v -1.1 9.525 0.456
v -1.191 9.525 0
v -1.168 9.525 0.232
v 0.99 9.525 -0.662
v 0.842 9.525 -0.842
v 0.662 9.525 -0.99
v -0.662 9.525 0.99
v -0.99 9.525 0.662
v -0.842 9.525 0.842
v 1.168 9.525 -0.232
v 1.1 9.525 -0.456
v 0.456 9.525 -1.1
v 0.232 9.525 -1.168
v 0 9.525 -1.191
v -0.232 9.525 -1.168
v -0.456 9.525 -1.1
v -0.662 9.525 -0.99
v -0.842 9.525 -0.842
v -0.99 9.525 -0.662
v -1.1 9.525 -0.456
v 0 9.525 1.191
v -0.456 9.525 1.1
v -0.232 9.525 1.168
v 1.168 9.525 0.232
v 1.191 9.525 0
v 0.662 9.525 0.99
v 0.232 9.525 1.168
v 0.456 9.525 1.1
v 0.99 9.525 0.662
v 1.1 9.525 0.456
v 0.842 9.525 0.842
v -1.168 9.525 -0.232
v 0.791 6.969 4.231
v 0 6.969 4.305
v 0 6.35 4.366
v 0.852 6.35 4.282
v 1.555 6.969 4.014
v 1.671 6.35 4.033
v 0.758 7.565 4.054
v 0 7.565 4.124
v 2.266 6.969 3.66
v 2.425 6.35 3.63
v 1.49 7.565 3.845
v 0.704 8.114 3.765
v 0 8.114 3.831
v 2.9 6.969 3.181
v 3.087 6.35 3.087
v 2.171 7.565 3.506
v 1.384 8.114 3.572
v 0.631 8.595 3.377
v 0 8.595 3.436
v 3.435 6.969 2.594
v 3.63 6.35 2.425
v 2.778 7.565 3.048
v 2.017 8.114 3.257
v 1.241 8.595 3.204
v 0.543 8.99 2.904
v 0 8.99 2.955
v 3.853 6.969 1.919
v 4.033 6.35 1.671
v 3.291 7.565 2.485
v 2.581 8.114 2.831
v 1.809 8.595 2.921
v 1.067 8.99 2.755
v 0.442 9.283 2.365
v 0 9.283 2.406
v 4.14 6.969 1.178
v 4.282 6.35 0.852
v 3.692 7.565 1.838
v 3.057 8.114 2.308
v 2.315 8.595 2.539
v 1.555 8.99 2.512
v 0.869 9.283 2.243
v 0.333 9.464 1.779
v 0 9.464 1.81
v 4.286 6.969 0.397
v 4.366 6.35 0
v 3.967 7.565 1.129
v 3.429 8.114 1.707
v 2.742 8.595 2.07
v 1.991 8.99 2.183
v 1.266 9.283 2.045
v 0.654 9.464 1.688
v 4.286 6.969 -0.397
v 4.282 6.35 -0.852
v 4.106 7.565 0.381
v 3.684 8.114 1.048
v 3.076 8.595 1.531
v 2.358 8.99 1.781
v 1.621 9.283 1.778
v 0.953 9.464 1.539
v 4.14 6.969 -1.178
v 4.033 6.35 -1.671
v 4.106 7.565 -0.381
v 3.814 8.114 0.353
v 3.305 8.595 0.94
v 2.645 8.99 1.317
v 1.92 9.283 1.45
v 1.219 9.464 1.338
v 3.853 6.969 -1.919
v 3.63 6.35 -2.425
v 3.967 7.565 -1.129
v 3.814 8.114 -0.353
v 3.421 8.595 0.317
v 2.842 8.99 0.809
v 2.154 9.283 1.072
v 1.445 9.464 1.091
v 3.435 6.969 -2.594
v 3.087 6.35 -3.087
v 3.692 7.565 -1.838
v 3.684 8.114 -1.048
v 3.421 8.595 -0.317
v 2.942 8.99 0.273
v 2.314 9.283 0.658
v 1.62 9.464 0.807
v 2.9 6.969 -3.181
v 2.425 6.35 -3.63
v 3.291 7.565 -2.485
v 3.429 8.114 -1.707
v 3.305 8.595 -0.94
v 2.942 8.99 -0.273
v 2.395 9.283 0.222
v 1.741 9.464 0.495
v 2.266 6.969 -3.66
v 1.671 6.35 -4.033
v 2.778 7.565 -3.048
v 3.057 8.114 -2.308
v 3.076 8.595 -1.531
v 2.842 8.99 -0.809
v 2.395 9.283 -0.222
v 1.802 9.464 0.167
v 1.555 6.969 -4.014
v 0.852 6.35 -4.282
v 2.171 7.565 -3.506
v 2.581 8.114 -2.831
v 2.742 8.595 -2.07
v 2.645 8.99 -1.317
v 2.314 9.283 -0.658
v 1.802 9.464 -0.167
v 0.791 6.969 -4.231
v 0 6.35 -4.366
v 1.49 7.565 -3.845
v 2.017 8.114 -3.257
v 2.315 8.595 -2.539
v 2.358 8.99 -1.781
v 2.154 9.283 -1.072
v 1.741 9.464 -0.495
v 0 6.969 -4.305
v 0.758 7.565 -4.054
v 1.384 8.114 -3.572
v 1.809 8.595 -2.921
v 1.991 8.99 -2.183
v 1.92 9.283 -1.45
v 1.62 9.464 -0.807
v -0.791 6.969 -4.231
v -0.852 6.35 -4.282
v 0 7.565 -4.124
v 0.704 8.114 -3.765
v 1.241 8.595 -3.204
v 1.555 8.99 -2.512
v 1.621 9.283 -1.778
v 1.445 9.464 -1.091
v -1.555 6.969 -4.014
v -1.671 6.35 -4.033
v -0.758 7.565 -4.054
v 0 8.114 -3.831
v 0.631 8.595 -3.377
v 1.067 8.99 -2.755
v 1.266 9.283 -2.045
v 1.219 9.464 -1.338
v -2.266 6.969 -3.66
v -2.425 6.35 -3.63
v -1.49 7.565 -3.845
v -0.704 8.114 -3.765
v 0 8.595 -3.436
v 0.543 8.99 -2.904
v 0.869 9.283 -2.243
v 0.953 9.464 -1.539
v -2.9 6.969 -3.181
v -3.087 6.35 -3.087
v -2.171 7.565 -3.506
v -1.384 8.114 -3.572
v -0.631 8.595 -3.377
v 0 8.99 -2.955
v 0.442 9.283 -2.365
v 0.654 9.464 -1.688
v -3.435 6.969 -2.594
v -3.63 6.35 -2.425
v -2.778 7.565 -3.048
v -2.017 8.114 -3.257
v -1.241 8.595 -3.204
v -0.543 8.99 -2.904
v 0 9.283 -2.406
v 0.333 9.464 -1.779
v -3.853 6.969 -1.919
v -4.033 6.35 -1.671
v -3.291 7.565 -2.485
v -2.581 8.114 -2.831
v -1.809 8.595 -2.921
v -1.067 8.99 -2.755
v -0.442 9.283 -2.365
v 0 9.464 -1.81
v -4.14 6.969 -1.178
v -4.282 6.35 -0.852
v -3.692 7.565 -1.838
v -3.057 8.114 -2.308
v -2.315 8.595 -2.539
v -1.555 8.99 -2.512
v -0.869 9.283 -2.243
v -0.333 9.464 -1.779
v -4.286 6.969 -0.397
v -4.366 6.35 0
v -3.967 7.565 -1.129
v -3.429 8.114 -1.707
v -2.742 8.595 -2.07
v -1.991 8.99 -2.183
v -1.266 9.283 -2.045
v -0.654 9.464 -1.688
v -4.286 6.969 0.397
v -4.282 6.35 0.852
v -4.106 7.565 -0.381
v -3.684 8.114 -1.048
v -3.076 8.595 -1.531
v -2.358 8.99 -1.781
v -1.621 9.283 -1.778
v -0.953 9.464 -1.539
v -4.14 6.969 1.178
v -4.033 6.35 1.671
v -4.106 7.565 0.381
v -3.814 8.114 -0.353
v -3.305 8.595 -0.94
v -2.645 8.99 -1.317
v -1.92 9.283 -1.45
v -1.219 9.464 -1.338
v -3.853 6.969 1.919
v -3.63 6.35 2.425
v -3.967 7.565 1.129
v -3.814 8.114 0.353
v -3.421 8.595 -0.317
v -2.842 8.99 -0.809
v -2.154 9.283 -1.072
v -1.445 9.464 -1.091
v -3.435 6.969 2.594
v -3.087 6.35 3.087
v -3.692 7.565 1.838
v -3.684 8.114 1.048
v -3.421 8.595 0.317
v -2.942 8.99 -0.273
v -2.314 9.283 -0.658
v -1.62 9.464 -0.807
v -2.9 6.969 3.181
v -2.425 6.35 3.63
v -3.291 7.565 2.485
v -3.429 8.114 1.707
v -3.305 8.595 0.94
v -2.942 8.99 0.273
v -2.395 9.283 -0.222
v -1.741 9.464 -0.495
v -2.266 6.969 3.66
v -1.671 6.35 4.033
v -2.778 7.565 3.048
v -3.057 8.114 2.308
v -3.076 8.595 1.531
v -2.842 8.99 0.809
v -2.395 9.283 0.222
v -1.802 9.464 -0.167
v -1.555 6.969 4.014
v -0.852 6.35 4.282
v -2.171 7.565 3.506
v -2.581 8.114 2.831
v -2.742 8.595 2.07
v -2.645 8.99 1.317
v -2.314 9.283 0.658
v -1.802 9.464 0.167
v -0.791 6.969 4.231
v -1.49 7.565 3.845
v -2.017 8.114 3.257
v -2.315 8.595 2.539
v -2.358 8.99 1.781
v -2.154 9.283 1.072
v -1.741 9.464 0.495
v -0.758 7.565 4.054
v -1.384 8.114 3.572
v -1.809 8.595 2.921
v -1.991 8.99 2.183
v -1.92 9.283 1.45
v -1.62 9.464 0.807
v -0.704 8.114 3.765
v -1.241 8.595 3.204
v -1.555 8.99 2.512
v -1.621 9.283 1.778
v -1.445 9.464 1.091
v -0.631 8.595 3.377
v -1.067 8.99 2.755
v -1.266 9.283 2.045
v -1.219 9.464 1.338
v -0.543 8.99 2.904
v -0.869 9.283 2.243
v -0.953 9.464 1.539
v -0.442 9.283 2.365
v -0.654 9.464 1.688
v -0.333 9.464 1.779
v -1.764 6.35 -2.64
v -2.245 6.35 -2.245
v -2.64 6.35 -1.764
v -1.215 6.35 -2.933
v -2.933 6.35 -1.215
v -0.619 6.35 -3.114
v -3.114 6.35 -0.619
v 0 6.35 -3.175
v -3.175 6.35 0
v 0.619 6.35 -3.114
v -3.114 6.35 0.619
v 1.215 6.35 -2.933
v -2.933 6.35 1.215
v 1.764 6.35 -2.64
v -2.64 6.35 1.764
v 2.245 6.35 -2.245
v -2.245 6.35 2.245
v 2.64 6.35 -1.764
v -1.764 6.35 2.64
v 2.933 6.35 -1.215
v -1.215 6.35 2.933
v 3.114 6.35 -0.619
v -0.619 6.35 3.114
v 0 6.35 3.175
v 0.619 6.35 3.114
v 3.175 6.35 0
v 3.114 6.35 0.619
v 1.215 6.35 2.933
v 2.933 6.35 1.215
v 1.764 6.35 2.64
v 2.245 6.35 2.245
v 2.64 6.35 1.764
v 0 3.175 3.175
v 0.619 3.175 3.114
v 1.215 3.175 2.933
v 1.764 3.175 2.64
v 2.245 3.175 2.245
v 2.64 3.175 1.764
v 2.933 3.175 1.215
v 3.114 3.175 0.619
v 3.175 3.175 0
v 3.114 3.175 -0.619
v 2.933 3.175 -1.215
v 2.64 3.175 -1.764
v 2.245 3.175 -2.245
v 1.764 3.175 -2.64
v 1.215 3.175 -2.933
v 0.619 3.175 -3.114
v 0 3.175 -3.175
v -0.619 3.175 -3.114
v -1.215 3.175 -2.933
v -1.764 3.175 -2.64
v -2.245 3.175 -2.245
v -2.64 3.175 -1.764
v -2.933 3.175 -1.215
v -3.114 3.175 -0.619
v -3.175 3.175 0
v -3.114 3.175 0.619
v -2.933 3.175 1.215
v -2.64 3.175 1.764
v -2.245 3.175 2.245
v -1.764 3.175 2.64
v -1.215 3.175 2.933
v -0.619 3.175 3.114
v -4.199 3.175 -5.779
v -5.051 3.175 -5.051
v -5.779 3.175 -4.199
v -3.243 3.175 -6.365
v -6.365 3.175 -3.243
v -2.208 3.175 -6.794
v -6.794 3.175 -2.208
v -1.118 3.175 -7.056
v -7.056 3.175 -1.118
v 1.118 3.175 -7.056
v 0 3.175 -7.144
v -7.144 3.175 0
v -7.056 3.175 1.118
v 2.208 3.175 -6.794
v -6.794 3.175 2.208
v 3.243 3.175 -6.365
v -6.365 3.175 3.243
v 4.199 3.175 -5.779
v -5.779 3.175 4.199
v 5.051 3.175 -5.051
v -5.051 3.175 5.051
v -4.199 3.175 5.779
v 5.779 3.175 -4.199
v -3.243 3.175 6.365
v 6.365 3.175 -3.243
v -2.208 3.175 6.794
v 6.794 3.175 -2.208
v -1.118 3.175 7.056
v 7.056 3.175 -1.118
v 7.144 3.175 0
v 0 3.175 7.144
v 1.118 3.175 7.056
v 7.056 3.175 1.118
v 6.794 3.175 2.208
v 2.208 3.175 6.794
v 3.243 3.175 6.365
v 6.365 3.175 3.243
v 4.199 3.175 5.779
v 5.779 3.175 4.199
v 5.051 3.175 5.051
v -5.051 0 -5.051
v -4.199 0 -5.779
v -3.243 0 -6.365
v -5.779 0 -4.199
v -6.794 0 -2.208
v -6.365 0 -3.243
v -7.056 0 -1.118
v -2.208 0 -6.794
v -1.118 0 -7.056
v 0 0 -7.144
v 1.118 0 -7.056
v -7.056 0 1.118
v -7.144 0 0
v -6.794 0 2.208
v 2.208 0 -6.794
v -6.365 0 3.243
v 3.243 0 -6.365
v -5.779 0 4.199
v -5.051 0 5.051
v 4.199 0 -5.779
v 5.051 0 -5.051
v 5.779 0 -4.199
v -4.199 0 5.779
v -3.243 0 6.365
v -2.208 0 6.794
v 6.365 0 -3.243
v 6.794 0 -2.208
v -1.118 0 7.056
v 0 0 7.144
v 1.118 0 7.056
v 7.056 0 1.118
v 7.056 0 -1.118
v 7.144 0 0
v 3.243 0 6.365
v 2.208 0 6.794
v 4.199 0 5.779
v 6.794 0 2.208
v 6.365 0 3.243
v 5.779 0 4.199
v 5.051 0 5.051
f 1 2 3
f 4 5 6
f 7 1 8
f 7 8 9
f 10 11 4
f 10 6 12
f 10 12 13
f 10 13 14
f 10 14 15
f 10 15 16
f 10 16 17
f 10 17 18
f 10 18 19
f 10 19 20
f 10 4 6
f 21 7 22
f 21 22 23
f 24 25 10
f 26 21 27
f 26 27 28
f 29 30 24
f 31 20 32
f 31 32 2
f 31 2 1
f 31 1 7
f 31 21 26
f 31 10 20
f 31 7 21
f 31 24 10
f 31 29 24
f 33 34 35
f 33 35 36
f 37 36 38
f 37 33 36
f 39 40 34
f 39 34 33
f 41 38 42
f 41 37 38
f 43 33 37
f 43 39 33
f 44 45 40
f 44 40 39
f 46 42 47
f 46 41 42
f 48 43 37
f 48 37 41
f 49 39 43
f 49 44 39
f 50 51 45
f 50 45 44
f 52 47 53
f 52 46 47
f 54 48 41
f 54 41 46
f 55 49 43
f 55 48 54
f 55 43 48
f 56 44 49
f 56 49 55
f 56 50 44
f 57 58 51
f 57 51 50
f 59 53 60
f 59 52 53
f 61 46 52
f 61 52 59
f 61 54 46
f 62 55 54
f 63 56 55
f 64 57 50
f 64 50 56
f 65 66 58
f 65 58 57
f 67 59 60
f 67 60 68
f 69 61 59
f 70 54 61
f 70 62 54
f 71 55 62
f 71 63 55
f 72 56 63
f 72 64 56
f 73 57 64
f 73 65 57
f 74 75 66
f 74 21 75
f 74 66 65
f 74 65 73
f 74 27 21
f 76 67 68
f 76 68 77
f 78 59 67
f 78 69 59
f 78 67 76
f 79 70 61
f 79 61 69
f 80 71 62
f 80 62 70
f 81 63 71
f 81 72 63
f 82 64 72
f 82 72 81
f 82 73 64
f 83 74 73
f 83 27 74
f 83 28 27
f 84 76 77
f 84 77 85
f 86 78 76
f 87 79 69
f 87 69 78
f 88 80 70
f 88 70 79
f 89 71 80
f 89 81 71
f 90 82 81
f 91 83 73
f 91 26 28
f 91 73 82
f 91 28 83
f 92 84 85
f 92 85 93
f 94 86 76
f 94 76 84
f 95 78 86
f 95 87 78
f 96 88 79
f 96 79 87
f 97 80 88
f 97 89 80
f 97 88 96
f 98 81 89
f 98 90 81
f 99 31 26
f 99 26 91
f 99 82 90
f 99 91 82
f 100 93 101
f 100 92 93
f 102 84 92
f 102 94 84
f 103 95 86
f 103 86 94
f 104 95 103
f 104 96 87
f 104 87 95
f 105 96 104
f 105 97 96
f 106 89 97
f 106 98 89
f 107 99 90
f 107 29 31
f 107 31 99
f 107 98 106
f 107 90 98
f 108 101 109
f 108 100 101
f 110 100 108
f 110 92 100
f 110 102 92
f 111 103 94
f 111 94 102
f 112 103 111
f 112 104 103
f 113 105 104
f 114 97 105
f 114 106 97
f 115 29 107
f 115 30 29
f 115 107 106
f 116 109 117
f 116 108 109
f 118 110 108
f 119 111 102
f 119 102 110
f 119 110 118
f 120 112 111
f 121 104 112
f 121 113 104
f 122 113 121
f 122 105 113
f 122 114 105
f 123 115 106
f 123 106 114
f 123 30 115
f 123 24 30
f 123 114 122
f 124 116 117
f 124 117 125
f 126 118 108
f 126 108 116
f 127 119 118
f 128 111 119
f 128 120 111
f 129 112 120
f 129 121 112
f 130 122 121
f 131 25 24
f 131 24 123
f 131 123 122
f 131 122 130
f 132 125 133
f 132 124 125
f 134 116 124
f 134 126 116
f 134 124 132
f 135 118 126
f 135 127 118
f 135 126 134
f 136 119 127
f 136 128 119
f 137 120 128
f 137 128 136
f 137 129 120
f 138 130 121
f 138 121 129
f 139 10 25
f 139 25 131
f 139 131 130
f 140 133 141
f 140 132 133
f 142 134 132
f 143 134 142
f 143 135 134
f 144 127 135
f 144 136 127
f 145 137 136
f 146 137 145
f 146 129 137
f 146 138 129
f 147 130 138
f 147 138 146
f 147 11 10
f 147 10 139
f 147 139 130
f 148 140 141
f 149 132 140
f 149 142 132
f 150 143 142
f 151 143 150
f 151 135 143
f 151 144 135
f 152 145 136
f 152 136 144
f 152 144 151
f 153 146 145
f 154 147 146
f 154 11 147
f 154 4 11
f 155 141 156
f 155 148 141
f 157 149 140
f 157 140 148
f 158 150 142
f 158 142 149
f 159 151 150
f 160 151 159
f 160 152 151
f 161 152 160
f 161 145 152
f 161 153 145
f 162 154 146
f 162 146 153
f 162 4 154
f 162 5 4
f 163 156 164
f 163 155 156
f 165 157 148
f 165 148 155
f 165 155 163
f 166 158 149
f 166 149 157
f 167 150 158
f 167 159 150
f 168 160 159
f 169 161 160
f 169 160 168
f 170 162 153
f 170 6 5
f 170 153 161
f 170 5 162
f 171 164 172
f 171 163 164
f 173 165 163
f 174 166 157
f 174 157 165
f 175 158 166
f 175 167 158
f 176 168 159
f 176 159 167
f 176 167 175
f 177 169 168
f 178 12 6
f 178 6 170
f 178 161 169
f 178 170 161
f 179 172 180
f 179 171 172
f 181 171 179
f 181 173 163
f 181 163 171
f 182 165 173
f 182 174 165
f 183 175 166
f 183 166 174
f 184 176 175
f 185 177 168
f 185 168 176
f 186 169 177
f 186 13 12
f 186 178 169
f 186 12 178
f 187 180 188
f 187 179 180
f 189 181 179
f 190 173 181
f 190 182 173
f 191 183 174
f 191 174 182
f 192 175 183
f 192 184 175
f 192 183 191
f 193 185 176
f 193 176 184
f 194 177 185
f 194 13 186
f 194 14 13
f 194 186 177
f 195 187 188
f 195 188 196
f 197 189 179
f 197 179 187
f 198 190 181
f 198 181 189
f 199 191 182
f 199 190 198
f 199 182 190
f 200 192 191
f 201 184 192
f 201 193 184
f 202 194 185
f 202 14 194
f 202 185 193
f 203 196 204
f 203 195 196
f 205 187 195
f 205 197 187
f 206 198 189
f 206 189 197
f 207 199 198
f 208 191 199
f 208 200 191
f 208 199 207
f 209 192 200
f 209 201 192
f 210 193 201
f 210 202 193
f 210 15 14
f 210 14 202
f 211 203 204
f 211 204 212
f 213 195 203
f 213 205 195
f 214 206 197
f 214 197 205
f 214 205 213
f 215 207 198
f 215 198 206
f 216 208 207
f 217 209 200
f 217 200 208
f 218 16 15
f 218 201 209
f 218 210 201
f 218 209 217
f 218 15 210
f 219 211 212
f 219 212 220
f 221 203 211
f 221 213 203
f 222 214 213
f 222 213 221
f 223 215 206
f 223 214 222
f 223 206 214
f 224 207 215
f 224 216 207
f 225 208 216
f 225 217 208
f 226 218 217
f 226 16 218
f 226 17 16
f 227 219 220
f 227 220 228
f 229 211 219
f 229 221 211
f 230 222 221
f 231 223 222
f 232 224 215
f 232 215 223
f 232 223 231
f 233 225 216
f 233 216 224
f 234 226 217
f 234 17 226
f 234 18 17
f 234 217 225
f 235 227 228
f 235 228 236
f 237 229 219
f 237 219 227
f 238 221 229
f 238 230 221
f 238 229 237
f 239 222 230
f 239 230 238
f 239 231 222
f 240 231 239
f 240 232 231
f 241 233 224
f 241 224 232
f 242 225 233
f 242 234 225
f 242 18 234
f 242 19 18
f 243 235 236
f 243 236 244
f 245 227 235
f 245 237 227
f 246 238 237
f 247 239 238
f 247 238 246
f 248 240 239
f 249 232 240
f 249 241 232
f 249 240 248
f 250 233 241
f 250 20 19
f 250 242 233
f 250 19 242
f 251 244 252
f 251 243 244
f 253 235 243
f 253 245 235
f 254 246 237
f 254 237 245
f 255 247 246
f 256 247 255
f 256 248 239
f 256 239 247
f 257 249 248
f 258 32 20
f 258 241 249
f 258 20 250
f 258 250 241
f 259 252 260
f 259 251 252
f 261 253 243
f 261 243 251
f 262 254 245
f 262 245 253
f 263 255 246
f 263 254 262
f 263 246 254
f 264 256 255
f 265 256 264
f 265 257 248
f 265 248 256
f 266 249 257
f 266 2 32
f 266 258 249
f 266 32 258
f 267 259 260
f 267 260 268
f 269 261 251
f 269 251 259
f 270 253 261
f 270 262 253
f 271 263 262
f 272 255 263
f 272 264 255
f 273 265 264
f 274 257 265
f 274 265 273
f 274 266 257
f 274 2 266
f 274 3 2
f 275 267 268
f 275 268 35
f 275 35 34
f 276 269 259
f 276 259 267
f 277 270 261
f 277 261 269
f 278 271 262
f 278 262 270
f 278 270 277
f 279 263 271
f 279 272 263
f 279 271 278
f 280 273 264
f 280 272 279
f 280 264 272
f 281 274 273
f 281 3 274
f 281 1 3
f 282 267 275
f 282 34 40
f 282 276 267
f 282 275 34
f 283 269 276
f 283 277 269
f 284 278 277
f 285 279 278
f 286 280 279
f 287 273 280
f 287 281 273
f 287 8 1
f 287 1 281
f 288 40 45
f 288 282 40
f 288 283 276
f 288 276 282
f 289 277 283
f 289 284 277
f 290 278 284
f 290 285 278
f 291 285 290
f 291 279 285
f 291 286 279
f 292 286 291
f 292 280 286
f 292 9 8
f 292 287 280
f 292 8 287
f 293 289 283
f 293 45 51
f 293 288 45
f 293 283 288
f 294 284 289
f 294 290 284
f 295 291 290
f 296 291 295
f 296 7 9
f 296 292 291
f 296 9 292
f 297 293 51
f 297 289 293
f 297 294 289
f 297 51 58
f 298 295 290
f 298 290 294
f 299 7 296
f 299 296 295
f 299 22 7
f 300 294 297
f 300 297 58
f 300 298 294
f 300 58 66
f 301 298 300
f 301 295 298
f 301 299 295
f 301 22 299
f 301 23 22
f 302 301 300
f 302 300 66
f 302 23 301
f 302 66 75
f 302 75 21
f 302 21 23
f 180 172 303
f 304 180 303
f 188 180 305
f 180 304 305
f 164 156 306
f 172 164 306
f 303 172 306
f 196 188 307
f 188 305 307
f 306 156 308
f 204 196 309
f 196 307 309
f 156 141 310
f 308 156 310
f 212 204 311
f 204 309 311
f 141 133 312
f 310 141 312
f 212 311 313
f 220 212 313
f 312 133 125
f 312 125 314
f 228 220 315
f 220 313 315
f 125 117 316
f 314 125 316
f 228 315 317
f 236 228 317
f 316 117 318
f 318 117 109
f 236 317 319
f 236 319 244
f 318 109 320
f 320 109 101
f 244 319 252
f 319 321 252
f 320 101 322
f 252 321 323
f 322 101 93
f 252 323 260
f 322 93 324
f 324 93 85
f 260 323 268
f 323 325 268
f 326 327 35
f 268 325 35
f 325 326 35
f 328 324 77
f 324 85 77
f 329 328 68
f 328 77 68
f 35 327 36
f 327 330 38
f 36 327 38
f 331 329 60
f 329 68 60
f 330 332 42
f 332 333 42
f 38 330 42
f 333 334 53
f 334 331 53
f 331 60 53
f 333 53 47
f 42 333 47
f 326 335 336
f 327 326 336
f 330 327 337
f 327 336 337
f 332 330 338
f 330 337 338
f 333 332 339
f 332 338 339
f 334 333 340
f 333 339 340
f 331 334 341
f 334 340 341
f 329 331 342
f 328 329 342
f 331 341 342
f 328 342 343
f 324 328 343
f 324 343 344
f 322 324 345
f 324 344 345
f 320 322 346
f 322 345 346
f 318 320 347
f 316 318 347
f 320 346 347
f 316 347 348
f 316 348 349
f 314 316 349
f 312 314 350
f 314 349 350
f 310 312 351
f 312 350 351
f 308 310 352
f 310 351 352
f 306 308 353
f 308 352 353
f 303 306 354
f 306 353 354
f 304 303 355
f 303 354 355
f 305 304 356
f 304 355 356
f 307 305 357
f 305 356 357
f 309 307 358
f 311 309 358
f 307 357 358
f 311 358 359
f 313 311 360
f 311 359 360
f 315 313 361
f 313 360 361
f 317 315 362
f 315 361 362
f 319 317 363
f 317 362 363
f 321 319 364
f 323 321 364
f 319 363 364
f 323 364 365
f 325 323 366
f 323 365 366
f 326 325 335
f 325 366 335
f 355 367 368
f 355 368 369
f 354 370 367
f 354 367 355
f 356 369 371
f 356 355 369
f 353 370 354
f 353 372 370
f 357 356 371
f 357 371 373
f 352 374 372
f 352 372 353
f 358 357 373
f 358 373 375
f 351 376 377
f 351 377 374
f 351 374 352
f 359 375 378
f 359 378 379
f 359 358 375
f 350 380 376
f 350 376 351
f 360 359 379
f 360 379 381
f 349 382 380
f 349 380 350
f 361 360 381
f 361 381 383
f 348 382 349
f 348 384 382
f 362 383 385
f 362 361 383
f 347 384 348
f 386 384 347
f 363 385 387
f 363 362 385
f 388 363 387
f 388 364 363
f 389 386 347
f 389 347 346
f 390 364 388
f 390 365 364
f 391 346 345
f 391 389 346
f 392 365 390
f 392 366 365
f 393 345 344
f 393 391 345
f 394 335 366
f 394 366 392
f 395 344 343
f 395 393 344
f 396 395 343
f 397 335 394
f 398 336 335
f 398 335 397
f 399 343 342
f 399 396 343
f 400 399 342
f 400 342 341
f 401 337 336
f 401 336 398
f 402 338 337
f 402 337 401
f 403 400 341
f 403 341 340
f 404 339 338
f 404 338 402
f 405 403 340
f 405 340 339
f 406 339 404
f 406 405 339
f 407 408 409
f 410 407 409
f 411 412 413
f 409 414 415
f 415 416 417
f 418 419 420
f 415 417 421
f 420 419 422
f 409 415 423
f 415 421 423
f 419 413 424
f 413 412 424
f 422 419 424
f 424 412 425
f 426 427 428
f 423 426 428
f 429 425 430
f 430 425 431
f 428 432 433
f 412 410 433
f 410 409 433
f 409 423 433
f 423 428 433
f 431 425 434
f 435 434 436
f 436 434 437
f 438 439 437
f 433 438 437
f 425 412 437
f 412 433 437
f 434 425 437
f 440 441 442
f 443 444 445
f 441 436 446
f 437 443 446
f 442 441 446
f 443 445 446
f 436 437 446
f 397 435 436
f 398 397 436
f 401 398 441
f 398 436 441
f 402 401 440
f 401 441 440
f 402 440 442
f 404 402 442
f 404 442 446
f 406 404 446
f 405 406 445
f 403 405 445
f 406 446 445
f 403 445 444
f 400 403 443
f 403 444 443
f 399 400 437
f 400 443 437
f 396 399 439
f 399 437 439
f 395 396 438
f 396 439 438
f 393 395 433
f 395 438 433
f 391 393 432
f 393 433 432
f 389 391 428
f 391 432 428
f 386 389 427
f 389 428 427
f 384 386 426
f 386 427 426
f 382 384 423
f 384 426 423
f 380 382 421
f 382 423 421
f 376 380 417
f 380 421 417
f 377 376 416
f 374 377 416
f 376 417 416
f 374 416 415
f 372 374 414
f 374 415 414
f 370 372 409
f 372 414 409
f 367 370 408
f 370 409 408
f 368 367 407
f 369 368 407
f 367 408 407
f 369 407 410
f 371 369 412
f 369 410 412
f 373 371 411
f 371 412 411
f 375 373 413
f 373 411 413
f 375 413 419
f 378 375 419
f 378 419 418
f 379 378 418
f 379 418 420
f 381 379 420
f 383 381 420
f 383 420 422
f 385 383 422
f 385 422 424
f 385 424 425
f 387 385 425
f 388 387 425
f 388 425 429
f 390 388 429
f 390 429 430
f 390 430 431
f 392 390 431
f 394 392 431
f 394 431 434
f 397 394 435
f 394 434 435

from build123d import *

# Parameters (mm, degrees)
SKETCH1_R           = 7.14375
BOSS_EXTRUDE1_DEPTH = 3.175
SKETCH2_R           = 3.175
BOSS_EXTRUDE2_DEPTH = 3.175
SKETCH3_R           = 4.365625
BOSS_EXTRUDE3_DEPTH = 3.175
FILLET1_R           = 3.175


with BuildPart() as part:
    # Sketch1 → Boss-Extrude1 (new body)
    with BuildSketch(Plane(origin=(0, 0, 0), x_dir=(1, 0, 0), z_dir=(0, 1, 0))):
        with Locations(Location((0, 0, 0), (0, 0, 270))):
            Circle(SKETCH1_R)
    extrude(amount=BOSS_EXTRUDE1_DEPTH)

    # Sketch2 → Boss-Extrude2 (add)
    with BuildSketch(Plane(origin=(0, 3.175, 0), x_dir=(1, 0, 0), z_dir=(0, 1, 0))):
        with Locations(Location((0, 0, 0), (0, 0, 270))):
            Circle(SKETCH2_R)
    extrude(amount=BOSS_EXTRUDE2_DEPTH)

    # Sketch3 → Boss-Extrude3 (add)
    with BuildSketch(Plane(origin=(0, 6.35, 0), x_dir=(1, 0, 0), z_dir=(0, 1, 0))):
        with Locations(Location((0, 0, 0), (0, 0, 270))):
            Circle(SKETCH3_R)
    extrude(amount=BOSS_EXTRUDE3_DEPTH)

    # Fillet1
    fillet1_edges = [part.edges().sort_by_distance(p)[0] for p in [
        (0, 9.525, -4.365625),
    ]]
    fillet(fillet1_edges, radius=FILLET1_R - 0.0001)  # a hair under: the kernel refuses the full size


solid = part.part
